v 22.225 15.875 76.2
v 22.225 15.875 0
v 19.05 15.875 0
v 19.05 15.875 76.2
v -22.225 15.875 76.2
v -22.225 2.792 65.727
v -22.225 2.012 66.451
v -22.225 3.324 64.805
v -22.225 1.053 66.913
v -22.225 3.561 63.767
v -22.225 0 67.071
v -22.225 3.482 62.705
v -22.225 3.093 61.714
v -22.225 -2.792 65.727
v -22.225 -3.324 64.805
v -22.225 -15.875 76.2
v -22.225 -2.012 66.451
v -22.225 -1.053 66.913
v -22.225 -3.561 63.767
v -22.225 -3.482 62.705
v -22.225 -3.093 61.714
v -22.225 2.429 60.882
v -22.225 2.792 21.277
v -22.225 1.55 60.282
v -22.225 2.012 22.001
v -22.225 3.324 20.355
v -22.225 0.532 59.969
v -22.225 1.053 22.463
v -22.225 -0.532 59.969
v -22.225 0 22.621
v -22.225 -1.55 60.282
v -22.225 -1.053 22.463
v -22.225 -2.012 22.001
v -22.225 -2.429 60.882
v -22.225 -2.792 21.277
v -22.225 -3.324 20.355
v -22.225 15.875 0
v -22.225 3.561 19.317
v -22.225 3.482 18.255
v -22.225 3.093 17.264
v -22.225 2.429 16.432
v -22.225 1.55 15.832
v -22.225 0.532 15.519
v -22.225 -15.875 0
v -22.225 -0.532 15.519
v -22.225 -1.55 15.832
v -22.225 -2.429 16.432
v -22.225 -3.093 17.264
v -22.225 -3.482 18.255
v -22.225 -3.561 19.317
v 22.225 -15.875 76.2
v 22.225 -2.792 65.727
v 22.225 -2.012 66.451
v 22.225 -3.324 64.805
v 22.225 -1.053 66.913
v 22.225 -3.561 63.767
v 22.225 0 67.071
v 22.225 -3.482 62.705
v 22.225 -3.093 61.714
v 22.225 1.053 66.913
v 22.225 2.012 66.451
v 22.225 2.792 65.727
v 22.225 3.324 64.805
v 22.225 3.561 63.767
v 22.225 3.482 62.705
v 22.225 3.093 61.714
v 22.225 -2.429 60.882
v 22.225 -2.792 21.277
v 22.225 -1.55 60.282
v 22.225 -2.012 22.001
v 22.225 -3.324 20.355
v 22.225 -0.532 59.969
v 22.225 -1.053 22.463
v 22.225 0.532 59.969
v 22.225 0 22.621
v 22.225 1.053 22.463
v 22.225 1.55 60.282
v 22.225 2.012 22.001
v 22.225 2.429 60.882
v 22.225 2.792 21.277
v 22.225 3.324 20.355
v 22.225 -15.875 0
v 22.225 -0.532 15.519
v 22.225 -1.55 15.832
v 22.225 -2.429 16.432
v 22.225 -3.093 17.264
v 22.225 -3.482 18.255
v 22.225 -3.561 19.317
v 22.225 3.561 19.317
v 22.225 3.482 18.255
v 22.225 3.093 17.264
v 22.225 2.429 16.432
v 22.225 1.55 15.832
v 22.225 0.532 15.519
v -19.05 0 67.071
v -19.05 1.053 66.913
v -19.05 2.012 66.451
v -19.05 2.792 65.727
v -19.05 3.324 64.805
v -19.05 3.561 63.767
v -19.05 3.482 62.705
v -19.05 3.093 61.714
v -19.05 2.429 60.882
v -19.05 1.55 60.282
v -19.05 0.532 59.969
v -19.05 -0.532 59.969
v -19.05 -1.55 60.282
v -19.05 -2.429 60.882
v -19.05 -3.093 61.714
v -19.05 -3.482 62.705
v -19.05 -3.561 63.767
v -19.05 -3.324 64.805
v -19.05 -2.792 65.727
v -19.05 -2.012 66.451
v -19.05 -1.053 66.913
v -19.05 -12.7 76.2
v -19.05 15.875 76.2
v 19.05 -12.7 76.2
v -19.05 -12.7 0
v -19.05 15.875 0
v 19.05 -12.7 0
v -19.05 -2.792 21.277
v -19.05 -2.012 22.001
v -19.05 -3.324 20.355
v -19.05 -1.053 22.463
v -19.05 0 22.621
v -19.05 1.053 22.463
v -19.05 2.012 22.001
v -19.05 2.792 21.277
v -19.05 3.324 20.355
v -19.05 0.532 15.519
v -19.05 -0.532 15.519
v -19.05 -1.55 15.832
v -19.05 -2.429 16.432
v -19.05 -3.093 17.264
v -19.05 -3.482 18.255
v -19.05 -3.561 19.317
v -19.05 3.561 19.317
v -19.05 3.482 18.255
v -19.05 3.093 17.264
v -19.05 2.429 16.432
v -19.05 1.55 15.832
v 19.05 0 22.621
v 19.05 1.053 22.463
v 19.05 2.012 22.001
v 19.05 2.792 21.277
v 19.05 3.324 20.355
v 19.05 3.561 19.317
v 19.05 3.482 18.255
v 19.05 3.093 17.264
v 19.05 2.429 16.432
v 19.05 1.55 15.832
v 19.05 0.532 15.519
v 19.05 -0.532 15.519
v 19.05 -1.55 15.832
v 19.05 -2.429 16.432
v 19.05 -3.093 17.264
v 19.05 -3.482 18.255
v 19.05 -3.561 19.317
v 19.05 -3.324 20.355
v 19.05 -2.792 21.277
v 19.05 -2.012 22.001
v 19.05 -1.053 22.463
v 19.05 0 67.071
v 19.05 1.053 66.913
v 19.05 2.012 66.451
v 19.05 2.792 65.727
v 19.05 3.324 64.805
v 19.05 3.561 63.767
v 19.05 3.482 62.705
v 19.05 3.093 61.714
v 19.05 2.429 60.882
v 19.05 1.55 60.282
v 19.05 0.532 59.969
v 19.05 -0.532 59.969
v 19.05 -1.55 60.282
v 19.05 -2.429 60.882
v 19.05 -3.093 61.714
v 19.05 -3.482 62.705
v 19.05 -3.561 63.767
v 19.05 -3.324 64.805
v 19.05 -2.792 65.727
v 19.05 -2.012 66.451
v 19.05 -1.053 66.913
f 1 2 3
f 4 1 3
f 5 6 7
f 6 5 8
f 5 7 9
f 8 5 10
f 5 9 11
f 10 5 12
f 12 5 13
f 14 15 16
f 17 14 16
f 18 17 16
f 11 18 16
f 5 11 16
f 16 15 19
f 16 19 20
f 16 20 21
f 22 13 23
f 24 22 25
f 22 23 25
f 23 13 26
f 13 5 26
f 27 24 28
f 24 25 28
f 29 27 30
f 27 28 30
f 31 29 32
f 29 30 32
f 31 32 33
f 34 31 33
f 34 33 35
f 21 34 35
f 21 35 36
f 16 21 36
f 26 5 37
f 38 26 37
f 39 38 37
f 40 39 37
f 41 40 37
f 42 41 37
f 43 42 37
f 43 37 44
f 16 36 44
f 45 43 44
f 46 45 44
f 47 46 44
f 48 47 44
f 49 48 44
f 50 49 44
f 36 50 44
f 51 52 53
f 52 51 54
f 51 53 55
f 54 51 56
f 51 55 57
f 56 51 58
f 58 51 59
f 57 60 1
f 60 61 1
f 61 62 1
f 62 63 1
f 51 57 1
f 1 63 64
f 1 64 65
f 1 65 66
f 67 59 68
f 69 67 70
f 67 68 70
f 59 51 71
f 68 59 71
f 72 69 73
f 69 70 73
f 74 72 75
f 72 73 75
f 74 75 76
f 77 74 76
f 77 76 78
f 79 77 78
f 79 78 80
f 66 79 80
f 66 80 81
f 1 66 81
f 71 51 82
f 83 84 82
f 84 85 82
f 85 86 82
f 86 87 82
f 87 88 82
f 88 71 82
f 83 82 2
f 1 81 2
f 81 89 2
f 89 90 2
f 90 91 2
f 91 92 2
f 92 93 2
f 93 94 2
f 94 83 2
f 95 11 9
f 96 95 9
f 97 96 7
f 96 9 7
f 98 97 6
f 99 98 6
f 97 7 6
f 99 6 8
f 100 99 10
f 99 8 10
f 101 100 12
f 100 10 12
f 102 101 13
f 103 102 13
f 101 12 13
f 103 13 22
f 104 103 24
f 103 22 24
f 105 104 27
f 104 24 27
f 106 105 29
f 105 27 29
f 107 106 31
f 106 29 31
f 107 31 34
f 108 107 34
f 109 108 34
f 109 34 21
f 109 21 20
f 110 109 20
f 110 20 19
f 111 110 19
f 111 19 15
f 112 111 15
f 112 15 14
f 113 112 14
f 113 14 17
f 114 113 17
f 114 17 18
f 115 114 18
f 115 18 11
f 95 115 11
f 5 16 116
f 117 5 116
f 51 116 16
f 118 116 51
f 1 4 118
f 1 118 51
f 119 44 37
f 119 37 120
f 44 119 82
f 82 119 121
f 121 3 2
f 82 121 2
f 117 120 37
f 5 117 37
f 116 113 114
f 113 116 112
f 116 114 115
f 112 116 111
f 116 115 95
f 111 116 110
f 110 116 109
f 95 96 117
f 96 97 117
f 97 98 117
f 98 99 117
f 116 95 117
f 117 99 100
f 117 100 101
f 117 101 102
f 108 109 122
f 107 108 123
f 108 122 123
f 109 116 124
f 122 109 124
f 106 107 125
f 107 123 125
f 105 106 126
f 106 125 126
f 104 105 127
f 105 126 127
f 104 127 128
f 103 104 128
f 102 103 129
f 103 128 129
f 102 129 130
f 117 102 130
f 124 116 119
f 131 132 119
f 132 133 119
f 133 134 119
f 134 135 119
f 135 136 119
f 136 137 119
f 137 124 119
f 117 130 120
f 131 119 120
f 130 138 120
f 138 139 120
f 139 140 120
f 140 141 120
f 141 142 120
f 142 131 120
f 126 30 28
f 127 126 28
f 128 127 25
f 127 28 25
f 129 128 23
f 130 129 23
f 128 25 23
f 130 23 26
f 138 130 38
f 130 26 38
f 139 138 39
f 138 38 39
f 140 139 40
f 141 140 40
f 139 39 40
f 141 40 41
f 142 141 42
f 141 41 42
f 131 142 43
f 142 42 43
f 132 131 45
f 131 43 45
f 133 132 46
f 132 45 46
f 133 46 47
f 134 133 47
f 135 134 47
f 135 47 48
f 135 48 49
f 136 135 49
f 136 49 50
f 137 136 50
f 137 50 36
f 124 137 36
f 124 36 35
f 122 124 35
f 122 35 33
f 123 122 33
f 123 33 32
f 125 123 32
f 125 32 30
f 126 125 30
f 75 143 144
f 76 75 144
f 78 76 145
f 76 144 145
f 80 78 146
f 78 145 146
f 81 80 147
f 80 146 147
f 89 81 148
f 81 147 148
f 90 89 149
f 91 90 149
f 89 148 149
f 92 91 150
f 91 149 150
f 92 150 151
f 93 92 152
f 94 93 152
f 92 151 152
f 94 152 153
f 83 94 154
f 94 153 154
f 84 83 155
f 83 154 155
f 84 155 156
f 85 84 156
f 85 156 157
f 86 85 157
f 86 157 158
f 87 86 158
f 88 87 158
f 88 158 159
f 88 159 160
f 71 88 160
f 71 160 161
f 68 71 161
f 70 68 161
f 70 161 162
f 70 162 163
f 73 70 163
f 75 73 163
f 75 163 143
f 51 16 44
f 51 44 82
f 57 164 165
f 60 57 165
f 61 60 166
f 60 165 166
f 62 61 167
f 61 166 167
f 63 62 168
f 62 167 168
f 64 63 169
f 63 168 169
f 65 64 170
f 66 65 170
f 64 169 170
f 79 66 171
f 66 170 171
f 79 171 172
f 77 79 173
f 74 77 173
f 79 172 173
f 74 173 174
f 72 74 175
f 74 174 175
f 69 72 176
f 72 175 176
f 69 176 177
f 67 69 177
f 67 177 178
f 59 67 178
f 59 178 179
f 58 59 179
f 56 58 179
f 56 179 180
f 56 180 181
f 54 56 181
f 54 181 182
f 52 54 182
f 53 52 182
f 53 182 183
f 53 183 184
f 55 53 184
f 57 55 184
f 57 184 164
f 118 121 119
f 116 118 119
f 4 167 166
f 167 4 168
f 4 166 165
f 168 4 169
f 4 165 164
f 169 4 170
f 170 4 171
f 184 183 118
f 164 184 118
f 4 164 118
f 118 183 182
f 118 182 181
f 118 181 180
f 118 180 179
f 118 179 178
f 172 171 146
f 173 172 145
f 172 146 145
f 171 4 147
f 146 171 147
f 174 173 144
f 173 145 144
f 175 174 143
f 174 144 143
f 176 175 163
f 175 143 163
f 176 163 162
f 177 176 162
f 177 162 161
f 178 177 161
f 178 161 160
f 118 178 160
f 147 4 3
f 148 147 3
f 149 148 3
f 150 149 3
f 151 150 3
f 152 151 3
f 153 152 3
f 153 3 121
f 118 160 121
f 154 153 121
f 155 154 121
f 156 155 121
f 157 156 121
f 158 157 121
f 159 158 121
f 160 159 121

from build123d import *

# Parameters (mm, degrees)
BOSS_EXTRUDE1_DEPTH     = 76.2
F_1_4_CLEARANCE_HOLE1_D = 7.14248


with BuildPart() as part:
    # Sketch2 → Boss-Extrude1 (new body)
    with BuildSketch(Plane.XY):
        Polygon((-19.05, 15.875), (-22.225, 15.875), (-22.225, -15.875), (22.225, -15.875), (22.225, 15.875), (19.05, 15.875), (19.05, -12.7), (-19.05, -12.7), align=None)
    extrude(amount=BOSS_EXTRUDE1_DEPTH)

    # 1/4 Clearance Hole1 (through all)
    with Locations(Plane(origin=(22.225, 0, 0), x_dir=(0, 0, -1), z_dir=(1, 0, 0))):
        with Locations((-19.05, 0), (-63.5, 0)):
            Hole(F_1_4_CLEARANCE_HOLE1_D / 2)


solid = part.part
